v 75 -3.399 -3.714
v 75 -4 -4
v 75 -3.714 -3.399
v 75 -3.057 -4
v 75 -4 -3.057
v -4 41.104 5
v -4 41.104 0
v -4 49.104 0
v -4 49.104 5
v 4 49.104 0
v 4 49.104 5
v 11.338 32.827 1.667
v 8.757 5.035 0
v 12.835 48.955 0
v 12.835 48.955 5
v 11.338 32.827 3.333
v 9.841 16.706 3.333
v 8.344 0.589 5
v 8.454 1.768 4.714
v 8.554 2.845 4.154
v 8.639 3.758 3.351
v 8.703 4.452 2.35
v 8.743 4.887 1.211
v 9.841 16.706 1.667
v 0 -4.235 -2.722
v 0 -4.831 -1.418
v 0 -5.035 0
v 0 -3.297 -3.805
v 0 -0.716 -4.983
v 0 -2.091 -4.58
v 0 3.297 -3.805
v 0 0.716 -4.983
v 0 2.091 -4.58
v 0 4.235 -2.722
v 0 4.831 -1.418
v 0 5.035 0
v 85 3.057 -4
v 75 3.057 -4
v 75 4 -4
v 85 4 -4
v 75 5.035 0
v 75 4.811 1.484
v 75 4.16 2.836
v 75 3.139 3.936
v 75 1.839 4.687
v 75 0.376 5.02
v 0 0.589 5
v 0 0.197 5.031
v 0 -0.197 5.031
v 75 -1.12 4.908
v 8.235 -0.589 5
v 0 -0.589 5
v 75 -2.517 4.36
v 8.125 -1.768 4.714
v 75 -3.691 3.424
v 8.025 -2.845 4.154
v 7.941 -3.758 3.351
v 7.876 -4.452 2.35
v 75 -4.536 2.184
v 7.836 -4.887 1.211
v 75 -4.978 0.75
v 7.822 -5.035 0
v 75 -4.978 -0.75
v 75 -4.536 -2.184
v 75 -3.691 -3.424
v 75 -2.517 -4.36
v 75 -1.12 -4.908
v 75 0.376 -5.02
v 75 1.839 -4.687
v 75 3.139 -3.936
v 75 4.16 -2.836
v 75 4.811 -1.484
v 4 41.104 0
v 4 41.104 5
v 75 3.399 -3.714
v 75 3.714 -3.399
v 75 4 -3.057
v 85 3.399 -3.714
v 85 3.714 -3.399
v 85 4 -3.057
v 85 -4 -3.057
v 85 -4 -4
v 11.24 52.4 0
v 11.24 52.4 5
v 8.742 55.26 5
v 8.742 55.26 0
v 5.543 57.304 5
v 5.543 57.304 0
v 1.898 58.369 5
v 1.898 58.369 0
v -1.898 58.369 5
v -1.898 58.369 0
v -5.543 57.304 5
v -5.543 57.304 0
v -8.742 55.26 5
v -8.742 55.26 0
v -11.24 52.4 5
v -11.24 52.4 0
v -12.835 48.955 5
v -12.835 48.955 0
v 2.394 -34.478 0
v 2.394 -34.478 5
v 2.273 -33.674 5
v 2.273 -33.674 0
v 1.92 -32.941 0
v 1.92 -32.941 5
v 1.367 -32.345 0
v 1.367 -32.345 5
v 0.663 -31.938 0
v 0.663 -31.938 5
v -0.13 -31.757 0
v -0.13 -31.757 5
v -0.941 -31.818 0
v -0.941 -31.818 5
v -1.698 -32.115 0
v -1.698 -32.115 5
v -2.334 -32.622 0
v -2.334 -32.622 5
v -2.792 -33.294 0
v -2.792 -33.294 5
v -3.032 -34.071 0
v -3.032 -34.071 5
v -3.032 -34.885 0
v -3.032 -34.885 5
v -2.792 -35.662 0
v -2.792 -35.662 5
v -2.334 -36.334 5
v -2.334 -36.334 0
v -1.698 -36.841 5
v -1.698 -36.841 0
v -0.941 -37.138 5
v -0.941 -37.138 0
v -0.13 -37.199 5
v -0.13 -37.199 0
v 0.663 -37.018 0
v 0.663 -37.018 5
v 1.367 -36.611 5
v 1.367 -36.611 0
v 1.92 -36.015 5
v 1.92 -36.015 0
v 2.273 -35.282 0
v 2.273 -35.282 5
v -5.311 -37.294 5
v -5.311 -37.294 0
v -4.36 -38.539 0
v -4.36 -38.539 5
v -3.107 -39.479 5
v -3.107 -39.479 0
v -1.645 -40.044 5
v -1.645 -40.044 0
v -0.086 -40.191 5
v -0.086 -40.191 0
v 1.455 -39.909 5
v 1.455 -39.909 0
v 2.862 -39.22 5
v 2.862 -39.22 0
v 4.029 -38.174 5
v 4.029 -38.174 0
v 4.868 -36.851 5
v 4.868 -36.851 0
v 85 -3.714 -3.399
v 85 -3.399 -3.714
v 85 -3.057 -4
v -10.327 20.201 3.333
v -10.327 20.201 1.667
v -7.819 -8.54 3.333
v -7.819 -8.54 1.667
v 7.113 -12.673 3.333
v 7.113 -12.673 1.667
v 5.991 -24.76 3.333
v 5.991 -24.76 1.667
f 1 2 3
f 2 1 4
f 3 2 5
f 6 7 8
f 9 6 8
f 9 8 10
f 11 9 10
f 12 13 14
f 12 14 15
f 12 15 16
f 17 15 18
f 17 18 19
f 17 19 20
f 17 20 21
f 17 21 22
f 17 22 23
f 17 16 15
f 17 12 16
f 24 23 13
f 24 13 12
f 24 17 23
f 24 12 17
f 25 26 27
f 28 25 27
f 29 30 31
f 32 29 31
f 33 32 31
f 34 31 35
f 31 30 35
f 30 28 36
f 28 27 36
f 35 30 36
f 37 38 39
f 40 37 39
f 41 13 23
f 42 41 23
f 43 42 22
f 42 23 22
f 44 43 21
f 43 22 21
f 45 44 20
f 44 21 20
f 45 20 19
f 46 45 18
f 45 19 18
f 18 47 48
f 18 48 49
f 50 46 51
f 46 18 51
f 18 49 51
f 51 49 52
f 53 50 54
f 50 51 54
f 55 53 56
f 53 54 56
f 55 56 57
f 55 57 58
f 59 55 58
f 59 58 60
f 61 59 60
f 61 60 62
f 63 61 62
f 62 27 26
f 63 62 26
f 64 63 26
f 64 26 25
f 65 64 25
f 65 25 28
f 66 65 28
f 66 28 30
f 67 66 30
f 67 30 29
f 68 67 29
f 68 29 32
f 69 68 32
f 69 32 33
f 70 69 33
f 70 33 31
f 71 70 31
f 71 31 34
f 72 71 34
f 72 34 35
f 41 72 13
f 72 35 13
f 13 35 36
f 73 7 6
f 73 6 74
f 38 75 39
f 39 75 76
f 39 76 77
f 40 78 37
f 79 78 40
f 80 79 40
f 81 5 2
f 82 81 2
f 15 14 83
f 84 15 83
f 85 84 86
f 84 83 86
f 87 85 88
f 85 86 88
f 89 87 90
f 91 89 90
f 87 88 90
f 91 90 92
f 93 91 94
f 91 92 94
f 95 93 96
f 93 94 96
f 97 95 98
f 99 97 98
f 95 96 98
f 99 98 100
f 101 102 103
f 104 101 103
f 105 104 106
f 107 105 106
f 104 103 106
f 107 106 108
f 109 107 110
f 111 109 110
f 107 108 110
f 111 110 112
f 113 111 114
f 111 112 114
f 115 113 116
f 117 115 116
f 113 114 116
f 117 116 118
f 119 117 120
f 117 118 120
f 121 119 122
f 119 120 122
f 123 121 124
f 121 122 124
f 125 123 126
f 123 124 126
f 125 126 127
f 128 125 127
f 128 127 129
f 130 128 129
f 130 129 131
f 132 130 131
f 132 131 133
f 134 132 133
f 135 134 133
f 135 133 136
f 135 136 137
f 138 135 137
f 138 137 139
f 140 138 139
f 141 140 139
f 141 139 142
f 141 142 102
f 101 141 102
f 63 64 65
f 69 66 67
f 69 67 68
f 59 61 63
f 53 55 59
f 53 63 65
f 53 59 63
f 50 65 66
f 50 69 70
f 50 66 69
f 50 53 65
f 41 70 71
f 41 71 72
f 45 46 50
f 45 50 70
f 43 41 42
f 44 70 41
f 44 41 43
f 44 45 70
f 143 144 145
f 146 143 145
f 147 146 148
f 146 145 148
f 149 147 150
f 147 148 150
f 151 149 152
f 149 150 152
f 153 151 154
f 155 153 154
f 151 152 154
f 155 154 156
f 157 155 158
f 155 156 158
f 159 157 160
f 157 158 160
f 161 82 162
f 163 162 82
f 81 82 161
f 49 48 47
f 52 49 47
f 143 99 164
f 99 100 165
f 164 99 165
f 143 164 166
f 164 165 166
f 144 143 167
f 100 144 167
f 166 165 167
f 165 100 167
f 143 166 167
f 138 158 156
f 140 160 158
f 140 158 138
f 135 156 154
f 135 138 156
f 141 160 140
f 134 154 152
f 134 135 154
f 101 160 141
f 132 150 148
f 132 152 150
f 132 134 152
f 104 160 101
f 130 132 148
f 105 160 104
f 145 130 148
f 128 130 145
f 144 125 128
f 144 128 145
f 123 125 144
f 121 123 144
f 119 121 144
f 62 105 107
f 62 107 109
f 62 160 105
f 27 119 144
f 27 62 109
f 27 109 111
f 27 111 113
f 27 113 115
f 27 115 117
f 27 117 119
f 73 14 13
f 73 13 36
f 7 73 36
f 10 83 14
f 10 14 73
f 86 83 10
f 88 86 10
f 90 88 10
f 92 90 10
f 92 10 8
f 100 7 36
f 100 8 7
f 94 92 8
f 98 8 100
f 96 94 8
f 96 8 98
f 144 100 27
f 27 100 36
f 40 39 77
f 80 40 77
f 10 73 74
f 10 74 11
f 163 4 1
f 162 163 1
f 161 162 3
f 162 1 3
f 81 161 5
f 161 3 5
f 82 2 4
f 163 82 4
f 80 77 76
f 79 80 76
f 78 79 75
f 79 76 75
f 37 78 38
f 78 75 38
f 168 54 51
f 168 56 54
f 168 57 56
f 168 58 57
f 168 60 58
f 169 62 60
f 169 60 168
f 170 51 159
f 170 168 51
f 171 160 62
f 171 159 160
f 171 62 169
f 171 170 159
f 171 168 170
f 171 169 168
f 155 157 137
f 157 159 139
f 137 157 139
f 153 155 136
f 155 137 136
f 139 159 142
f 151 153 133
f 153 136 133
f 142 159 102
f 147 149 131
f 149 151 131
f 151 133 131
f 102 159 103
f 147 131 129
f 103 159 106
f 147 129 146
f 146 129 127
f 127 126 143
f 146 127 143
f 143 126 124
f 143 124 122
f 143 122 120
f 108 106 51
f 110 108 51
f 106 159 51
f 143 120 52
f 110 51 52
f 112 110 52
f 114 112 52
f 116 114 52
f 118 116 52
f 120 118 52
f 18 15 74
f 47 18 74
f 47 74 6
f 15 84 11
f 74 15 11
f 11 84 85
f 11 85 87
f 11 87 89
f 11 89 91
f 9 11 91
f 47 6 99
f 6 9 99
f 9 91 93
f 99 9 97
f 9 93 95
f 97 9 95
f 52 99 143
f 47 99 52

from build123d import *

# Parameters (mm, degrees)
F0_R     = 5.0345603454
F1_DEPTH = 75
F3_W     = 8
F3_H     = 8
F4_DEPTH = 5
F6_DEPTH = 10
F7_R     = 2.7283514887
F8_DEPTH = 25


with BuildPart() as f1:
    # F0 (on Right) → F1 (new body)
    with BuildSketch(Plane.YZ):
        Circle(F0_R)
    extrude(amount=F1_DEPTH)

    # F3 (on Top) → F4 (join)
    with BuildSketch(Plane.XY):
        with BuildLine():
            add(Edge.make_bspline(
                [(12.8348679437, 48.9545158337), (10.1793770282, 20.3342274985), (7.5238861127, -8.231182894), (4.8683951972, -36.8514712291)],
                knots=[0, 0, 0, 0, 86.1750085805, 86.1750085805, 86.1750085805, 86.1750085805], degree=3))
            ThreePointArc((12.8348679437, 48.9545158337), (-2.794e-06, 58.504055005), (-12.8348735316, 48.9545158337))
            add(Edge.make_bspline(
                [(-12.8348735316, 48.9545158337), (-10.3269097443, 20.1867005239), (-7.8189459569, -8.5262368434), (-5.3109821696, -37.2940521532)],
                knots=[0, 0, 0, 0, 86.5761192305, 86.5761192305, 86.5761192305, 86.5761192305], degree=3))
            ThreePointArc((-5.3109821696, -37.2940521532), (-0.0857201671, -40.1909529666), (4.8683951972, -36.8514712291))
        make_face()
        with Locations((-2.794e-06, 45.1040573379)):
            Rectangle(F3_W, F3_H, mode=Mode.SUBTRACT)
    extrude(amount=F4_DEPTH)

    # F7 (on face) → F8 (cut)
    with BuildSketch(Plane.XY.offset(5)):
        with Locations((-0.3341082492, -34.4780180346)):
            Circle(F7_R)
    extrude(amount=-F8_DEPTH, mode=Mode.SUBTRACT)


with BuildPart() as f6:
    # F5 (on face) → F6 (new body)
    with BuildSketch(Plane.YZ.offset(75)):
        with BuildLine():
            Line((3.0572533215, -4), (4, -4))
            Line((4, -4), (4, -3.0572533215))
            ThreePointArc((4, -3.0572533215), (3.5599717605, -3.5599717605), (3.0572533215, -4))
        make_face()
    extrude(amount=F6_DEPTH)


with BuildPart() as f6b:
    # F5 (on face) → F6, piece 2 (new body)
    with BuildSketch(Plane.YZ.offset(75)):
        with BuildLine():
            Line((-4, -4), (-3.0572533215, -4))
            ThreePointArc((-3.0572533215, -4), (-3.5599717605, -3.5599717605), (-4, -3.0572533215))
            Line((-4, -3.0572533215), (-4, -4))
        make_face()
    extrude(amount=F6_DEPTH)


solid = Compound([f1.part, f6.part, f6b.part])
